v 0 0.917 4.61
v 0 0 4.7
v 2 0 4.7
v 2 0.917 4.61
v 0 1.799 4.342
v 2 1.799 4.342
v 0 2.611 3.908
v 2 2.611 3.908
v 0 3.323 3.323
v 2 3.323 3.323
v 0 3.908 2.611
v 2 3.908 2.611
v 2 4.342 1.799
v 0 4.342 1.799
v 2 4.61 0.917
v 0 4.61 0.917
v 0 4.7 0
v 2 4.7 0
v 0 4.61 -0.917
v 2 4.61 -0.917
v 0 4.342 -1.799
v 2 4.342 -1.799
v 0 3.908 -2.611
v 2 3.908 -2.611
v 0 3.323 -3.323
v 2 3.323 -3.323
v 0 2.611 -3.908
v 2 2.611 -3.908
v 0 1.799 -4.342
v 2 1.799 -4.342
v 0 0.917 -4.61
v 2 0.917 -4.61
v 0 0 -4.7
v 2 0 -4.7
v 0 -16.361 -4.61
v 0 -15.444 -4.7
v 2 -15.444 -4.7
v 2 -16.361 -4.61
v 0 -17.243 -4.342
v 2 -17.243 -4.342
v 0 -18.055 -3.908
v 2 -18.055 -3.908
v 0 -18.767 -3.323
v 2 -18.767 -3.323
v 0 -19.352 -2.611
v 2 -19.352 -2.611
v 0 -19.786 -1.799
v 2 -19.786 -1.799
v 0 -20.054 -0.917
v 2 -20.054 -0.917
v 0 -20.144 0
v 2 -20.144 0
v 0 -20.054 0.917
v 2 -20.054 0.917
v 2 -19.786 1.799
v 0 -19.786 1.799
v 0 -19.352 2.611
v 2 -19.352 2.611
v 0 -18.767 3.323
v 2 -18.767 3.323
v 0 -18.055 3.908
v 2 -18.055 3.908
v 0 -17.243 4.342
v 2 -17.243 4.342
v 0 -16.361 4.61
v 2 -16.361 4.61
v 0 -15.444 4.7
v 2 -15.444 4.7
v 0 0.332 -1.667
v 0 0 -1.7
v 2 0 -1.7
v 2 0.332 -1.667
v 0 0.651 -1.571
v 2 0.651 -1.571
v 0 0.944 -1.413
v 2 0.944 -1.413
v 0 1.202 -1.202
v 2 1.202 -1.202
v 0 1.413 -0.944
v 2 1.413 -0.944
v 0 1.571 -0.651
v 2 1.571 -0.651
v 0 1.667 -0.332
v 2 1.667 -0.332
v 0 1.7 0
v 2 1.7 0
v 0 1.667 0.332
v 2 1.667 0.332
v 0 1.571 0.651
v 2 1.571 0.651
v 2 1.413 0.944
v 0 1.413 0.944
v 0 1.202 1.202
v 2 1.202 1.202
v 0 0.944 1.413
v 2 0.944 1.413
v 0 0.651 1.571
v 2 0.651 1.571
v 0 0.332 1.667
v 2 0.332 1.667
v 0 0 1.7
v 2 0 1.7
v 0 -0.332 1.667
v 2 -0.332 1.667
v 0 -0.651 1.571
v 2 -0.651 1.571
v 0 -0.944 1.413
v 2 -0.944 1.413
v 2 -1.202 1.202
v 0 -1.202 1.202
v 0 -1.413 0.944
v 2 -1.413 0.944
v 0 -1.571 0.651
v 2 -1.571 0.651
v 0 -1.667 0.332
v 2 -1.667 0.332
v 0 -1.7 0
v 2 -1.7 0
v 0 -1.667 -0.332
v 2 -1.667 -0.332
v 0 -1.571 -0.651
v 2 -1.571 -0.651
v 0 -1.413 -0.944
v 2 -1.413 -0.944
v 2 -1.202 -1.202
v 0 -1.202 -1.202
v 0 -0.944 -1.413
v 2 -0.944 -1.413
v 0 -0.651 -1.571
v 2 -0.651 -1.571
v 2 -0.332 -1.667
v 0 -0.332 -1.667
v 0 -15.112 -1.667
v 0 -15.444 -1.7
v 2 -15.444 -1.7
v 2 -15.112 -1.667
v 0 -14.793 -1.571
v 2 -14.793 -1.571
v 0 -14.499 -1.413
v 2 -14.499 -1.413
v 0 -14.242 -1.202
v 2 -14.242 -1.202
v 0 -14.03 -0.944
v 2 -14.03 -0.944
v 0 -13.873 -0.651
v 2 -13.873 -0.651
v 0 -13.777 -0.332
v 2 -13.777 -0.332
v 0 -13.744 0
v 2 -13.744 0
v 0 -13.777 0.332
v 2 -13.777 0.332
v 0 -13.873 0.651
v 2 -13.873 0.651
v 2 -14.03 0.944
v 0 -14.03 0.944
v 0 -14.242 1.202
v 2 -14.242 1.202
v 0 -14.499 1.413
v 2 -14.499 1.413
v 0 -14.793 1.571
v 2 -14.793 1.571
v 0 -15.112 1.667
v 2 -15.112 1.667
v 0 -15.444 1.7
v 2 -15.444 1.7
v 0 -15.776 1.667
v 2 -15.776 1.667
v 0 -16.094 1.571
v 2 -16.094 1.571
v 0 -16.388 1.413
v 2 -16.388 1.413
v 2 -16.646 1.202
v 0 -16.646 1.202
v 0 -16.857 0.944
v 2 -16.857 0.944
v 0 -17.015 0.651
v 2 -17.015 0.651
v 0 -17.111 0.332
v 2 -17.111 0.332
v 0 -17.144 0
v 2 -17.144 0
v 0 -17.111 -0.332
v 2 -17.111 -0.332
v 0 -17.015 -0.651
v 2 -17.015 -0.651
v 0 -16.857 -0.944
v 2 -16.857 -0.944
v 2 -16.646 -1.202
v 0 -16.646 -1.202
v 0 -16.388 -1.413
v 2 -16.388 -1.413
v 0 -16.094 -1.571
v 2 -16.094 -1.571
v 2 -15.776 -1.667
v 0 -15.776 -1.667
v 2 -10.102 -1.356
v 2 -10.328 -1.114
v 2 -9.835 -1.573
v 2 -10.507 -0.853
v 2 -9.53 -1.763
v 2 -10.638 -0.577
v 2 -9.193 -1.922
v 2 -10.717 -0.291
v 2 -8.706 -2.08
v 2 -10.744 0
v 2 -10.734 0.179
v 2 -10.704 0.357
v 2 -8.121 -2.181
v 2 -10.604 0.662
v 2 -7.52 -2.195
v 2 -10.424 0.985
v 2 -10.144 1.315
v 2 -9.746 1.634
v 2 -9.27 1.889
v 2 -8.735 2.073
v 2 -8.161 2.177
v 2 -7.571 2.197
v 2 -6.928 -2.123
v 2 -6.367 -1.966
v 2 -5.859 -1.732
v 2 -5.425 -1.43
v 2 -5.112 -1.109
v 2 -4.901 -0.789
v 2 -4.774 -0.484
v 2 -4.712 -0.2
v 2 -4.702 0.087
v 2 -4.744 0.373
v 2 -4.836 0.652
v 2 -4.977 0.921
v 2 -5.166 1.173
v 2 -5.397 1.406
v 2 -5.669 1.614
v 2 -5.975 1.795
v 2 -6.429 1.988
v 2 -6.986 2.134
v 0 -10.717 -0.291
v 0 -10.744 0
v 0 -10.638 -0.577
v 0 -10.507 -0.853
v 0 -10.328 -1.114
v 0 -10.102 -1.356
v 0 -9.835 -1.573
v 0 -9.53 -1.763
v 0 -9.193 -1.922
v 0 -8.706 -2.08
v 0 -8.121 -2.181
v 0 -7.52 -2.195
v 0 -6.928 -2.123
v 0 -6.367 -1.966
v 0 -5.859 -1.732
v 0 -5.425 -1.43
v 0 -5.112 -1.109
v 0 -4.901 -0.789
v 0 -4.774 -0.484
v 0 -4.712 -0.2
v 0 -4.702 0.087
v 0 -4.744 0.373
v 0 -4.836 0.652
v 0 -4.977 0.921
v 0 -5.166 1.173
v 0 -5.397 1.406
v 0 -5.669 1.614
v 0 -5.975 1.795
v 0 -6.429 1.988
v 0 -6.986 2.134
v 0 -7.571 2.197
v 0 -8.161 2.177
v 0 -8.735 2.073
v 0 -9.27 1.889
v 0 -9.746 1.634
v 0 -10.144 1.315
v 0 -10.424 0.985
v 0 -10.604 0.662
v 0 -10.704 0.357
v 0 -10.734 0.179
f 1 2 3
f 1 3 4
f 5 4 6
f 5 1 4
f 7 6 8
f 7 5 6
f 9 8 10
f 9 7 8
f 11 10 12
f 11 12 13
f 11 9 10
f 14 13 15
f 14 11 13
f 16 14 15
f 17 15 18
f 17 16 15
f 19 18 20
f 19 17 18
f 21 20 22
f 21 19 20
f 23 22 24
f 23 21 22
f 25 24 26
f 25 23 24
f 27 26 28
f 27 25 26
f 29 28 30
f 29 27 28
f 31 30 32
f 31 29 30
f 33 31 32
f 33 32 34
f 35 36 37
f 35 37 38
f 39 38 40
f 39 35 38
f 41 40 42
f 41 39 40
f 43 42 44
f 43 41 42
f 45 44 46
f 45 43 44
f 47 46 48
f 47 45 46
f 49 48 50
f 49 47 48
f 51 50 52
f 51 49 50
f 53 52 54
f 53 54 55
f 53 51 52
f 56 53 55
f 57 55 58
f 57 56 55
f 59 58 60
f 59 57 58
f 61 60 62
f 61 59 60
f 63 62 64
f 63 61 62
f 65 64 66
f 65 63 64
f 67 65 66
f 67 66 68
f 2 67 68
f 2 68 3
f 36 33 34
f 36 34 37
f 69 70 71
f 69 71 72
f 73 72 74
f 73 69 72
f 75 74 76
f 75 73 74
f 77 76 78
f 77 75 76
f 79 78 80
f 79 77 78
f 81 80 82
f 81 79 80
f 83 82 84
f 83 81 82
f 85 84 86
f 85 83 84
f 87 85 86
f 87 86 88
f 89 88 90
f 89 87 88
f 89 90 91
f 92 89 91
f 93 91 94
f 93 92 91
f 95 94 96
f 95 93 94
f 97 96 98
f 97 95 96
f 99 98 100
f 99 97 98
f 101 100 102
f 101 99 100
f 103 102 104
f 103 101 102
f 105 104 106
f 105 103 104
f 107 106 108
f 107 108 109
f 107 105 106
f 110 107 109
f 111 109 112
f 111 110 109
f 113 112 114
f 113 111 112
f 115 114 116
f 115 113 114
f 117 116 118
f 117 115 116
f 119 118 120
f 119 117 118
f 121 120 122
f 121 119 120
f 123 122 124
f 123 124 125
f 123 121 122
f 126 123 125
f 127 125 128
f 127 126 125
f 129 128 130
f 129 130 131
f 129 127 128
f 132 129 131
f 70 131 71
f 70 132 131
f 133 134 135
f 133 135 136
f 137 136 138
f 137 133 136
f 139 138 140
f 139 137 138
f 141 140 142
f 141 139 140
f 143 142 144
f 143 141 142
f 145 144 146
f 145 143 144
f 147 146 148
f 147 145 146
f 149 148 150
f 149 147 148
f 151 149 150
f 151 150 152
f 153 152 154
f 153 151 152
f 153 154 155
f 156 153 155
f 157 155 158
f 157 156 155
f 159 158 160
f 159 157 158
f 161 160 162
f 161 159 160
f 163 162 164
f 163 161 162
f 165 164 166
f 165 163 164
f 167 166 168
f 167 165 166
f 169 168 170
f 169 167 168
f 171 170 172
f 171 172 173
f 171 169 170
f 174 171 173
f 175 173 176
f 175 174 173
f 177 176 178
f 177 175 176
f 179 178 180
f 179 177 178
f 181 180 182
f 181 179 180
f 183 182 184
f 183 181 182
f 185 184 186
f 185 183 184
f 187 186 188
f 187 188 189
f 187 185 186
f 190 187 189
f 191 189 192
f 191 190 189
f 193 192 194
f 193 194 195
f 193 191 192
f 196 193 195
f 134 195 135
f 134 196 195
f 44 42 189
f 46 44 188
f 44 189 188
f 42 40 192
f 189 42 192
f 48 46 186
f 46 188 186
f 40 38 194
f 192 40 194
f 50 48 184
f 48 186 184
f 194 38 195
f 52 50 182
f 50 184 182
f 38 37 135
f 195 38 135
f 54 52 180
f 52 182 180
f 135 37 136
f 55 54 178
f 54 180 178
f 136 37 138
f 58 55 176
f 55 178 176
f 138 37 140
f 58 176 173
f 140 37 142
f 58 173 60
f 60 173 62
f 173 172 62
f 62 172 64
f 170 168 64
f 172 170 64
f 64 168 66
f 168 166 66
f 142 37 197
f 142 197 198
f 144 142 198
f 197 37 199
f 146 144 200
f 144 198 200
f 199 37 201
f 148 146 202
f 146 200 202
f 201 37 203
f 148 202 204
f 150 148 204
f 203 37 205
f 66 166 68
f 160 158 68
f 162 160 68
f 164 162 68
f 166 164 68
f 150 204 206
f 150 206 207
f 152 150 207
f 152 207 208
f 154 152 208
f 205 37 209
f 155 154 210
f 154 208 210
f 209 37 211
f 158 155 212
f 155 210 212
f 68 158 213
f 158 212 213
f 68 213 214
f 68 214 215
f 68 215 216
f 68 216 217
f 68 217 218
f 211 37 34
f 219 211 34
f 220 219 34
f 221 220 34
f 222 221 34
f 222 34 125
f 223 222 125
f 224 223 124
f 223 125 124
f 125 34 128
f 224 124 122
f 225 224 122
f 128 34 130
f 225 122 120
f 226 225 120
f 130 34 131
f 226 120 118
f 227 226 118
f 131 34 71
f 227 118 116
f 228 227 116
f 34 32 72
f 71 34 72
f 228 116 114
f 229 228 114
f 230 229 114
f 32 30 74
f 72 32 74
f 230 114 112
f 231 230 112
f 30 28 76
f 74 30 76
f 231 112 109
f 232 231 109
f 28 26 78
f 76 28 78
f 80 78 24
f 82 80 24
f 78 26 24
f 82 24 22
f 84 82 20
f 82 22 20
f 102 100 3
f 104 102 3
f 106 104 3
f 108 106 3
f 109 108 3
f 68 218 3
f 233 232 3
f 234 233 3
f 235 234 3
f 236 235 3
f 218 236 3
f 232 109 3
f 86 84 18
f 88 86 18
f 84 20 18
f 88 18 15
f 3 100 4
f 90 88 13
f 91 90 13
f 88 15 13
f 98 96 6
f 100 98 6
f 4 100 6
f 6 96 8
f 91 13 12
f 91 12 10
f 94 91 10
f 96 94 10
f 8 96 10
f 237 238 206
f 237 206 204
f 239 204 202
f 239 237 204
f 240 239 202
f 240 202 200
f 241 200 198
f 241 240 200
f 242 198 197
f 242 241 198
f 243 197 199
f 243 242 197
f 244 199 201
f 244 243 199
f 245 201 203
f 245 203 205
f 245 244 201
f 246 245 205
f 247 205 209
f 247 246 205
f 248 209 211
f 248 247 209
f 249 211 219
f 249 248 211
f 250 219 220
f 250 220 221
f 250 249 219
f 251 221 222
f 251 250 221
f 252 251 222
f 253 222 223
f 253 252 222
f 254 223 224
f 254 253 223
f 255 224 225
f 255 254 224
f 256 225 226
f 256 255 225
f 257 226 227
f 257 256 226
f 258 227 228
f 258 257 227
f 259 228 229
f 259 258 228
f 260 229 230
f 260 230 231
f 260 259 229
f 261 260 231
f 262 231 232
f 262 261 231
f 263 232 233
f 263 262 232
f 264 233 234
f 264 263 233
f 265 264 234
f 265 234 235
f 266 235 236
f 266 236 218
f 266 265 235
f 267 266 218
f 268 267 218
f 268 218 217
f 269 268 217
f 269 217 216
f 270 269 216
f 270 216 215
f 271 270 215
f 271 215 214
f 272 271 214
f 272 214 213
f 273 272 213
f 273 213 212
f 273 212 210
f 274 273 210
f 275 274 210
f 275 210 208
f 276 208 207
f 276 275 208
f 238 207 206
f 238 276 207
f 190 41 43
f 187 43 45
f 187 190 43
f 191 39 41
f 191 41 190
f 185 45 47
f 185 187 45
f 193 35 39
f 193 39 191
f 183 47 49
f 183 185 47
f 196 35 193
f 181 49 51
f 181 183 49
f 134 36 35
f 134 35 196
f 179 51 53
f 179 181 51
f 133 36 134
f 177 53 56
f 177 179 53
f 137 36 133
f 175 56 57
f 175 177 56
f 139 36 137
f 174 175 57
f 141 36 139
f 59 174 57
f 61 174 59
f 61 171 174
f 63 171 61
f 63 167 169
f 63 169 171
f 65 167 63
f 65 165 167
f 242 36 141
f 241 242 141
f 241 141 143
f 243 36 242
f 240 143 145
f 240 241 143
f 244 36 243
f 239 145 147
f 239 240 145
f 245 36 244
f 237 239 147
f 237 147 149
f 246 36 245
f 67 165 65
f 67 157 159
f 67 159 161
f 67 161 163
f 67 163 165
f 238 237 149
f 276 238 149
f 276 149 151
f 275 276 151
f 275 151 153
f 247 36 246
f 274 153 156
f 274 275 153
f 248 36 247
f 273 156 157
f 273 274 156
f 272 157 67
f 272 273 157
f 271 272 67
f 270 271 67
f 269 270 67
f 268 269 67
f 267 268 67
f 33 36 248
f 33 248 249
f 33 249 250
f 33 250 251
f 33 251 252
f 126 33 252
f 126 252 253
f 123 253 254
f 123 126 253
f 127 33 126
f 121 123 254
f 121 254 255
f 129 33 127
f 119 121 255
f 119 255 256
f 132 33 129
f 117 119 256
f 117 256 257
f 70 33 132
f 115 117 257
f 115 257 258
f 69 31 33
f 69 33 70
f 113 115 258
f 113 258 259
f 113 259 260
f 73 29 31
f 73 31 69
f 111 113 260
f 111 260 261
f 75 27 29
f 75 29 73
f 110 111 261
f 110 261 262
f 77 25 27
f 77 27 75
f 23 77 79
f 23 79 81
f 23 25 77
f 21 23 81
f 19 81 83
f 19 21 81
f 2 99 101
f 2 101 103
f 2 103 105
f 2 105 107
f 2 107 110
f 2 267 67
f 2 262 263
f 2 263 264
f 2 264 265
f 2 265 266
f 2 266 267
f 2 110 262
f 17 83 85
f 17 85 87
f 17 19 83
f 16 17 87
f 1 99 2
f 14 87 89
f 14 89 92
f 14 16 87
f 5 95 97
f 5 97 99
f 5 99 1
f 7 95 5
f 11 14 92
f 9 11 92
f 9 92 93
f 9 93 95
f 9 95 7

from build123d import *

# Parameters (mm, degrees)
SKETCH1_R           = 1.7
SKETCH1_RX          = 3.021964858
SKETCH1_RY          = 2.2
BOSS_EXTRUDE1_DEPTH = 2


with BuildPart() as part:
    # Sketch1 → Boss-Extrude1 (new body)
    with BuildSketch(Plane(origin=(0, 0, 0), x_dir=(0, 0, -1), z_dir=(1, 0, 0))):
        with BuildLine():
            Line((-4.7, -15.443929717), (-4.7, 0))
            ThreePointArc((-4.7, 0), (0, 4.7), (4.7, 0))
            Line((4.7, 0), (4.7, -15.443929717))
            ThreePointArc((4.7, -15.443929717), (0, -20.143929717), (-4.7, -15.443929717))
        make_face()
        Circle(SKETCH1_R, mode=Mode.SUBTRACT)
        with Locations((0, -15.443929717)):
            Circle(SKETCH1_R, mode=Mode.SUBTRACT)
        with Locations(Location((0, -7.721964858), (0, 0, -90))):
            Ellipse(SKETCH1_RX, SKETCH1_RY, mode=Mode.SUBTRACT)
    extrude(amount=BOSS_EXTRUDE1_DEPTH)


solid = part.part
